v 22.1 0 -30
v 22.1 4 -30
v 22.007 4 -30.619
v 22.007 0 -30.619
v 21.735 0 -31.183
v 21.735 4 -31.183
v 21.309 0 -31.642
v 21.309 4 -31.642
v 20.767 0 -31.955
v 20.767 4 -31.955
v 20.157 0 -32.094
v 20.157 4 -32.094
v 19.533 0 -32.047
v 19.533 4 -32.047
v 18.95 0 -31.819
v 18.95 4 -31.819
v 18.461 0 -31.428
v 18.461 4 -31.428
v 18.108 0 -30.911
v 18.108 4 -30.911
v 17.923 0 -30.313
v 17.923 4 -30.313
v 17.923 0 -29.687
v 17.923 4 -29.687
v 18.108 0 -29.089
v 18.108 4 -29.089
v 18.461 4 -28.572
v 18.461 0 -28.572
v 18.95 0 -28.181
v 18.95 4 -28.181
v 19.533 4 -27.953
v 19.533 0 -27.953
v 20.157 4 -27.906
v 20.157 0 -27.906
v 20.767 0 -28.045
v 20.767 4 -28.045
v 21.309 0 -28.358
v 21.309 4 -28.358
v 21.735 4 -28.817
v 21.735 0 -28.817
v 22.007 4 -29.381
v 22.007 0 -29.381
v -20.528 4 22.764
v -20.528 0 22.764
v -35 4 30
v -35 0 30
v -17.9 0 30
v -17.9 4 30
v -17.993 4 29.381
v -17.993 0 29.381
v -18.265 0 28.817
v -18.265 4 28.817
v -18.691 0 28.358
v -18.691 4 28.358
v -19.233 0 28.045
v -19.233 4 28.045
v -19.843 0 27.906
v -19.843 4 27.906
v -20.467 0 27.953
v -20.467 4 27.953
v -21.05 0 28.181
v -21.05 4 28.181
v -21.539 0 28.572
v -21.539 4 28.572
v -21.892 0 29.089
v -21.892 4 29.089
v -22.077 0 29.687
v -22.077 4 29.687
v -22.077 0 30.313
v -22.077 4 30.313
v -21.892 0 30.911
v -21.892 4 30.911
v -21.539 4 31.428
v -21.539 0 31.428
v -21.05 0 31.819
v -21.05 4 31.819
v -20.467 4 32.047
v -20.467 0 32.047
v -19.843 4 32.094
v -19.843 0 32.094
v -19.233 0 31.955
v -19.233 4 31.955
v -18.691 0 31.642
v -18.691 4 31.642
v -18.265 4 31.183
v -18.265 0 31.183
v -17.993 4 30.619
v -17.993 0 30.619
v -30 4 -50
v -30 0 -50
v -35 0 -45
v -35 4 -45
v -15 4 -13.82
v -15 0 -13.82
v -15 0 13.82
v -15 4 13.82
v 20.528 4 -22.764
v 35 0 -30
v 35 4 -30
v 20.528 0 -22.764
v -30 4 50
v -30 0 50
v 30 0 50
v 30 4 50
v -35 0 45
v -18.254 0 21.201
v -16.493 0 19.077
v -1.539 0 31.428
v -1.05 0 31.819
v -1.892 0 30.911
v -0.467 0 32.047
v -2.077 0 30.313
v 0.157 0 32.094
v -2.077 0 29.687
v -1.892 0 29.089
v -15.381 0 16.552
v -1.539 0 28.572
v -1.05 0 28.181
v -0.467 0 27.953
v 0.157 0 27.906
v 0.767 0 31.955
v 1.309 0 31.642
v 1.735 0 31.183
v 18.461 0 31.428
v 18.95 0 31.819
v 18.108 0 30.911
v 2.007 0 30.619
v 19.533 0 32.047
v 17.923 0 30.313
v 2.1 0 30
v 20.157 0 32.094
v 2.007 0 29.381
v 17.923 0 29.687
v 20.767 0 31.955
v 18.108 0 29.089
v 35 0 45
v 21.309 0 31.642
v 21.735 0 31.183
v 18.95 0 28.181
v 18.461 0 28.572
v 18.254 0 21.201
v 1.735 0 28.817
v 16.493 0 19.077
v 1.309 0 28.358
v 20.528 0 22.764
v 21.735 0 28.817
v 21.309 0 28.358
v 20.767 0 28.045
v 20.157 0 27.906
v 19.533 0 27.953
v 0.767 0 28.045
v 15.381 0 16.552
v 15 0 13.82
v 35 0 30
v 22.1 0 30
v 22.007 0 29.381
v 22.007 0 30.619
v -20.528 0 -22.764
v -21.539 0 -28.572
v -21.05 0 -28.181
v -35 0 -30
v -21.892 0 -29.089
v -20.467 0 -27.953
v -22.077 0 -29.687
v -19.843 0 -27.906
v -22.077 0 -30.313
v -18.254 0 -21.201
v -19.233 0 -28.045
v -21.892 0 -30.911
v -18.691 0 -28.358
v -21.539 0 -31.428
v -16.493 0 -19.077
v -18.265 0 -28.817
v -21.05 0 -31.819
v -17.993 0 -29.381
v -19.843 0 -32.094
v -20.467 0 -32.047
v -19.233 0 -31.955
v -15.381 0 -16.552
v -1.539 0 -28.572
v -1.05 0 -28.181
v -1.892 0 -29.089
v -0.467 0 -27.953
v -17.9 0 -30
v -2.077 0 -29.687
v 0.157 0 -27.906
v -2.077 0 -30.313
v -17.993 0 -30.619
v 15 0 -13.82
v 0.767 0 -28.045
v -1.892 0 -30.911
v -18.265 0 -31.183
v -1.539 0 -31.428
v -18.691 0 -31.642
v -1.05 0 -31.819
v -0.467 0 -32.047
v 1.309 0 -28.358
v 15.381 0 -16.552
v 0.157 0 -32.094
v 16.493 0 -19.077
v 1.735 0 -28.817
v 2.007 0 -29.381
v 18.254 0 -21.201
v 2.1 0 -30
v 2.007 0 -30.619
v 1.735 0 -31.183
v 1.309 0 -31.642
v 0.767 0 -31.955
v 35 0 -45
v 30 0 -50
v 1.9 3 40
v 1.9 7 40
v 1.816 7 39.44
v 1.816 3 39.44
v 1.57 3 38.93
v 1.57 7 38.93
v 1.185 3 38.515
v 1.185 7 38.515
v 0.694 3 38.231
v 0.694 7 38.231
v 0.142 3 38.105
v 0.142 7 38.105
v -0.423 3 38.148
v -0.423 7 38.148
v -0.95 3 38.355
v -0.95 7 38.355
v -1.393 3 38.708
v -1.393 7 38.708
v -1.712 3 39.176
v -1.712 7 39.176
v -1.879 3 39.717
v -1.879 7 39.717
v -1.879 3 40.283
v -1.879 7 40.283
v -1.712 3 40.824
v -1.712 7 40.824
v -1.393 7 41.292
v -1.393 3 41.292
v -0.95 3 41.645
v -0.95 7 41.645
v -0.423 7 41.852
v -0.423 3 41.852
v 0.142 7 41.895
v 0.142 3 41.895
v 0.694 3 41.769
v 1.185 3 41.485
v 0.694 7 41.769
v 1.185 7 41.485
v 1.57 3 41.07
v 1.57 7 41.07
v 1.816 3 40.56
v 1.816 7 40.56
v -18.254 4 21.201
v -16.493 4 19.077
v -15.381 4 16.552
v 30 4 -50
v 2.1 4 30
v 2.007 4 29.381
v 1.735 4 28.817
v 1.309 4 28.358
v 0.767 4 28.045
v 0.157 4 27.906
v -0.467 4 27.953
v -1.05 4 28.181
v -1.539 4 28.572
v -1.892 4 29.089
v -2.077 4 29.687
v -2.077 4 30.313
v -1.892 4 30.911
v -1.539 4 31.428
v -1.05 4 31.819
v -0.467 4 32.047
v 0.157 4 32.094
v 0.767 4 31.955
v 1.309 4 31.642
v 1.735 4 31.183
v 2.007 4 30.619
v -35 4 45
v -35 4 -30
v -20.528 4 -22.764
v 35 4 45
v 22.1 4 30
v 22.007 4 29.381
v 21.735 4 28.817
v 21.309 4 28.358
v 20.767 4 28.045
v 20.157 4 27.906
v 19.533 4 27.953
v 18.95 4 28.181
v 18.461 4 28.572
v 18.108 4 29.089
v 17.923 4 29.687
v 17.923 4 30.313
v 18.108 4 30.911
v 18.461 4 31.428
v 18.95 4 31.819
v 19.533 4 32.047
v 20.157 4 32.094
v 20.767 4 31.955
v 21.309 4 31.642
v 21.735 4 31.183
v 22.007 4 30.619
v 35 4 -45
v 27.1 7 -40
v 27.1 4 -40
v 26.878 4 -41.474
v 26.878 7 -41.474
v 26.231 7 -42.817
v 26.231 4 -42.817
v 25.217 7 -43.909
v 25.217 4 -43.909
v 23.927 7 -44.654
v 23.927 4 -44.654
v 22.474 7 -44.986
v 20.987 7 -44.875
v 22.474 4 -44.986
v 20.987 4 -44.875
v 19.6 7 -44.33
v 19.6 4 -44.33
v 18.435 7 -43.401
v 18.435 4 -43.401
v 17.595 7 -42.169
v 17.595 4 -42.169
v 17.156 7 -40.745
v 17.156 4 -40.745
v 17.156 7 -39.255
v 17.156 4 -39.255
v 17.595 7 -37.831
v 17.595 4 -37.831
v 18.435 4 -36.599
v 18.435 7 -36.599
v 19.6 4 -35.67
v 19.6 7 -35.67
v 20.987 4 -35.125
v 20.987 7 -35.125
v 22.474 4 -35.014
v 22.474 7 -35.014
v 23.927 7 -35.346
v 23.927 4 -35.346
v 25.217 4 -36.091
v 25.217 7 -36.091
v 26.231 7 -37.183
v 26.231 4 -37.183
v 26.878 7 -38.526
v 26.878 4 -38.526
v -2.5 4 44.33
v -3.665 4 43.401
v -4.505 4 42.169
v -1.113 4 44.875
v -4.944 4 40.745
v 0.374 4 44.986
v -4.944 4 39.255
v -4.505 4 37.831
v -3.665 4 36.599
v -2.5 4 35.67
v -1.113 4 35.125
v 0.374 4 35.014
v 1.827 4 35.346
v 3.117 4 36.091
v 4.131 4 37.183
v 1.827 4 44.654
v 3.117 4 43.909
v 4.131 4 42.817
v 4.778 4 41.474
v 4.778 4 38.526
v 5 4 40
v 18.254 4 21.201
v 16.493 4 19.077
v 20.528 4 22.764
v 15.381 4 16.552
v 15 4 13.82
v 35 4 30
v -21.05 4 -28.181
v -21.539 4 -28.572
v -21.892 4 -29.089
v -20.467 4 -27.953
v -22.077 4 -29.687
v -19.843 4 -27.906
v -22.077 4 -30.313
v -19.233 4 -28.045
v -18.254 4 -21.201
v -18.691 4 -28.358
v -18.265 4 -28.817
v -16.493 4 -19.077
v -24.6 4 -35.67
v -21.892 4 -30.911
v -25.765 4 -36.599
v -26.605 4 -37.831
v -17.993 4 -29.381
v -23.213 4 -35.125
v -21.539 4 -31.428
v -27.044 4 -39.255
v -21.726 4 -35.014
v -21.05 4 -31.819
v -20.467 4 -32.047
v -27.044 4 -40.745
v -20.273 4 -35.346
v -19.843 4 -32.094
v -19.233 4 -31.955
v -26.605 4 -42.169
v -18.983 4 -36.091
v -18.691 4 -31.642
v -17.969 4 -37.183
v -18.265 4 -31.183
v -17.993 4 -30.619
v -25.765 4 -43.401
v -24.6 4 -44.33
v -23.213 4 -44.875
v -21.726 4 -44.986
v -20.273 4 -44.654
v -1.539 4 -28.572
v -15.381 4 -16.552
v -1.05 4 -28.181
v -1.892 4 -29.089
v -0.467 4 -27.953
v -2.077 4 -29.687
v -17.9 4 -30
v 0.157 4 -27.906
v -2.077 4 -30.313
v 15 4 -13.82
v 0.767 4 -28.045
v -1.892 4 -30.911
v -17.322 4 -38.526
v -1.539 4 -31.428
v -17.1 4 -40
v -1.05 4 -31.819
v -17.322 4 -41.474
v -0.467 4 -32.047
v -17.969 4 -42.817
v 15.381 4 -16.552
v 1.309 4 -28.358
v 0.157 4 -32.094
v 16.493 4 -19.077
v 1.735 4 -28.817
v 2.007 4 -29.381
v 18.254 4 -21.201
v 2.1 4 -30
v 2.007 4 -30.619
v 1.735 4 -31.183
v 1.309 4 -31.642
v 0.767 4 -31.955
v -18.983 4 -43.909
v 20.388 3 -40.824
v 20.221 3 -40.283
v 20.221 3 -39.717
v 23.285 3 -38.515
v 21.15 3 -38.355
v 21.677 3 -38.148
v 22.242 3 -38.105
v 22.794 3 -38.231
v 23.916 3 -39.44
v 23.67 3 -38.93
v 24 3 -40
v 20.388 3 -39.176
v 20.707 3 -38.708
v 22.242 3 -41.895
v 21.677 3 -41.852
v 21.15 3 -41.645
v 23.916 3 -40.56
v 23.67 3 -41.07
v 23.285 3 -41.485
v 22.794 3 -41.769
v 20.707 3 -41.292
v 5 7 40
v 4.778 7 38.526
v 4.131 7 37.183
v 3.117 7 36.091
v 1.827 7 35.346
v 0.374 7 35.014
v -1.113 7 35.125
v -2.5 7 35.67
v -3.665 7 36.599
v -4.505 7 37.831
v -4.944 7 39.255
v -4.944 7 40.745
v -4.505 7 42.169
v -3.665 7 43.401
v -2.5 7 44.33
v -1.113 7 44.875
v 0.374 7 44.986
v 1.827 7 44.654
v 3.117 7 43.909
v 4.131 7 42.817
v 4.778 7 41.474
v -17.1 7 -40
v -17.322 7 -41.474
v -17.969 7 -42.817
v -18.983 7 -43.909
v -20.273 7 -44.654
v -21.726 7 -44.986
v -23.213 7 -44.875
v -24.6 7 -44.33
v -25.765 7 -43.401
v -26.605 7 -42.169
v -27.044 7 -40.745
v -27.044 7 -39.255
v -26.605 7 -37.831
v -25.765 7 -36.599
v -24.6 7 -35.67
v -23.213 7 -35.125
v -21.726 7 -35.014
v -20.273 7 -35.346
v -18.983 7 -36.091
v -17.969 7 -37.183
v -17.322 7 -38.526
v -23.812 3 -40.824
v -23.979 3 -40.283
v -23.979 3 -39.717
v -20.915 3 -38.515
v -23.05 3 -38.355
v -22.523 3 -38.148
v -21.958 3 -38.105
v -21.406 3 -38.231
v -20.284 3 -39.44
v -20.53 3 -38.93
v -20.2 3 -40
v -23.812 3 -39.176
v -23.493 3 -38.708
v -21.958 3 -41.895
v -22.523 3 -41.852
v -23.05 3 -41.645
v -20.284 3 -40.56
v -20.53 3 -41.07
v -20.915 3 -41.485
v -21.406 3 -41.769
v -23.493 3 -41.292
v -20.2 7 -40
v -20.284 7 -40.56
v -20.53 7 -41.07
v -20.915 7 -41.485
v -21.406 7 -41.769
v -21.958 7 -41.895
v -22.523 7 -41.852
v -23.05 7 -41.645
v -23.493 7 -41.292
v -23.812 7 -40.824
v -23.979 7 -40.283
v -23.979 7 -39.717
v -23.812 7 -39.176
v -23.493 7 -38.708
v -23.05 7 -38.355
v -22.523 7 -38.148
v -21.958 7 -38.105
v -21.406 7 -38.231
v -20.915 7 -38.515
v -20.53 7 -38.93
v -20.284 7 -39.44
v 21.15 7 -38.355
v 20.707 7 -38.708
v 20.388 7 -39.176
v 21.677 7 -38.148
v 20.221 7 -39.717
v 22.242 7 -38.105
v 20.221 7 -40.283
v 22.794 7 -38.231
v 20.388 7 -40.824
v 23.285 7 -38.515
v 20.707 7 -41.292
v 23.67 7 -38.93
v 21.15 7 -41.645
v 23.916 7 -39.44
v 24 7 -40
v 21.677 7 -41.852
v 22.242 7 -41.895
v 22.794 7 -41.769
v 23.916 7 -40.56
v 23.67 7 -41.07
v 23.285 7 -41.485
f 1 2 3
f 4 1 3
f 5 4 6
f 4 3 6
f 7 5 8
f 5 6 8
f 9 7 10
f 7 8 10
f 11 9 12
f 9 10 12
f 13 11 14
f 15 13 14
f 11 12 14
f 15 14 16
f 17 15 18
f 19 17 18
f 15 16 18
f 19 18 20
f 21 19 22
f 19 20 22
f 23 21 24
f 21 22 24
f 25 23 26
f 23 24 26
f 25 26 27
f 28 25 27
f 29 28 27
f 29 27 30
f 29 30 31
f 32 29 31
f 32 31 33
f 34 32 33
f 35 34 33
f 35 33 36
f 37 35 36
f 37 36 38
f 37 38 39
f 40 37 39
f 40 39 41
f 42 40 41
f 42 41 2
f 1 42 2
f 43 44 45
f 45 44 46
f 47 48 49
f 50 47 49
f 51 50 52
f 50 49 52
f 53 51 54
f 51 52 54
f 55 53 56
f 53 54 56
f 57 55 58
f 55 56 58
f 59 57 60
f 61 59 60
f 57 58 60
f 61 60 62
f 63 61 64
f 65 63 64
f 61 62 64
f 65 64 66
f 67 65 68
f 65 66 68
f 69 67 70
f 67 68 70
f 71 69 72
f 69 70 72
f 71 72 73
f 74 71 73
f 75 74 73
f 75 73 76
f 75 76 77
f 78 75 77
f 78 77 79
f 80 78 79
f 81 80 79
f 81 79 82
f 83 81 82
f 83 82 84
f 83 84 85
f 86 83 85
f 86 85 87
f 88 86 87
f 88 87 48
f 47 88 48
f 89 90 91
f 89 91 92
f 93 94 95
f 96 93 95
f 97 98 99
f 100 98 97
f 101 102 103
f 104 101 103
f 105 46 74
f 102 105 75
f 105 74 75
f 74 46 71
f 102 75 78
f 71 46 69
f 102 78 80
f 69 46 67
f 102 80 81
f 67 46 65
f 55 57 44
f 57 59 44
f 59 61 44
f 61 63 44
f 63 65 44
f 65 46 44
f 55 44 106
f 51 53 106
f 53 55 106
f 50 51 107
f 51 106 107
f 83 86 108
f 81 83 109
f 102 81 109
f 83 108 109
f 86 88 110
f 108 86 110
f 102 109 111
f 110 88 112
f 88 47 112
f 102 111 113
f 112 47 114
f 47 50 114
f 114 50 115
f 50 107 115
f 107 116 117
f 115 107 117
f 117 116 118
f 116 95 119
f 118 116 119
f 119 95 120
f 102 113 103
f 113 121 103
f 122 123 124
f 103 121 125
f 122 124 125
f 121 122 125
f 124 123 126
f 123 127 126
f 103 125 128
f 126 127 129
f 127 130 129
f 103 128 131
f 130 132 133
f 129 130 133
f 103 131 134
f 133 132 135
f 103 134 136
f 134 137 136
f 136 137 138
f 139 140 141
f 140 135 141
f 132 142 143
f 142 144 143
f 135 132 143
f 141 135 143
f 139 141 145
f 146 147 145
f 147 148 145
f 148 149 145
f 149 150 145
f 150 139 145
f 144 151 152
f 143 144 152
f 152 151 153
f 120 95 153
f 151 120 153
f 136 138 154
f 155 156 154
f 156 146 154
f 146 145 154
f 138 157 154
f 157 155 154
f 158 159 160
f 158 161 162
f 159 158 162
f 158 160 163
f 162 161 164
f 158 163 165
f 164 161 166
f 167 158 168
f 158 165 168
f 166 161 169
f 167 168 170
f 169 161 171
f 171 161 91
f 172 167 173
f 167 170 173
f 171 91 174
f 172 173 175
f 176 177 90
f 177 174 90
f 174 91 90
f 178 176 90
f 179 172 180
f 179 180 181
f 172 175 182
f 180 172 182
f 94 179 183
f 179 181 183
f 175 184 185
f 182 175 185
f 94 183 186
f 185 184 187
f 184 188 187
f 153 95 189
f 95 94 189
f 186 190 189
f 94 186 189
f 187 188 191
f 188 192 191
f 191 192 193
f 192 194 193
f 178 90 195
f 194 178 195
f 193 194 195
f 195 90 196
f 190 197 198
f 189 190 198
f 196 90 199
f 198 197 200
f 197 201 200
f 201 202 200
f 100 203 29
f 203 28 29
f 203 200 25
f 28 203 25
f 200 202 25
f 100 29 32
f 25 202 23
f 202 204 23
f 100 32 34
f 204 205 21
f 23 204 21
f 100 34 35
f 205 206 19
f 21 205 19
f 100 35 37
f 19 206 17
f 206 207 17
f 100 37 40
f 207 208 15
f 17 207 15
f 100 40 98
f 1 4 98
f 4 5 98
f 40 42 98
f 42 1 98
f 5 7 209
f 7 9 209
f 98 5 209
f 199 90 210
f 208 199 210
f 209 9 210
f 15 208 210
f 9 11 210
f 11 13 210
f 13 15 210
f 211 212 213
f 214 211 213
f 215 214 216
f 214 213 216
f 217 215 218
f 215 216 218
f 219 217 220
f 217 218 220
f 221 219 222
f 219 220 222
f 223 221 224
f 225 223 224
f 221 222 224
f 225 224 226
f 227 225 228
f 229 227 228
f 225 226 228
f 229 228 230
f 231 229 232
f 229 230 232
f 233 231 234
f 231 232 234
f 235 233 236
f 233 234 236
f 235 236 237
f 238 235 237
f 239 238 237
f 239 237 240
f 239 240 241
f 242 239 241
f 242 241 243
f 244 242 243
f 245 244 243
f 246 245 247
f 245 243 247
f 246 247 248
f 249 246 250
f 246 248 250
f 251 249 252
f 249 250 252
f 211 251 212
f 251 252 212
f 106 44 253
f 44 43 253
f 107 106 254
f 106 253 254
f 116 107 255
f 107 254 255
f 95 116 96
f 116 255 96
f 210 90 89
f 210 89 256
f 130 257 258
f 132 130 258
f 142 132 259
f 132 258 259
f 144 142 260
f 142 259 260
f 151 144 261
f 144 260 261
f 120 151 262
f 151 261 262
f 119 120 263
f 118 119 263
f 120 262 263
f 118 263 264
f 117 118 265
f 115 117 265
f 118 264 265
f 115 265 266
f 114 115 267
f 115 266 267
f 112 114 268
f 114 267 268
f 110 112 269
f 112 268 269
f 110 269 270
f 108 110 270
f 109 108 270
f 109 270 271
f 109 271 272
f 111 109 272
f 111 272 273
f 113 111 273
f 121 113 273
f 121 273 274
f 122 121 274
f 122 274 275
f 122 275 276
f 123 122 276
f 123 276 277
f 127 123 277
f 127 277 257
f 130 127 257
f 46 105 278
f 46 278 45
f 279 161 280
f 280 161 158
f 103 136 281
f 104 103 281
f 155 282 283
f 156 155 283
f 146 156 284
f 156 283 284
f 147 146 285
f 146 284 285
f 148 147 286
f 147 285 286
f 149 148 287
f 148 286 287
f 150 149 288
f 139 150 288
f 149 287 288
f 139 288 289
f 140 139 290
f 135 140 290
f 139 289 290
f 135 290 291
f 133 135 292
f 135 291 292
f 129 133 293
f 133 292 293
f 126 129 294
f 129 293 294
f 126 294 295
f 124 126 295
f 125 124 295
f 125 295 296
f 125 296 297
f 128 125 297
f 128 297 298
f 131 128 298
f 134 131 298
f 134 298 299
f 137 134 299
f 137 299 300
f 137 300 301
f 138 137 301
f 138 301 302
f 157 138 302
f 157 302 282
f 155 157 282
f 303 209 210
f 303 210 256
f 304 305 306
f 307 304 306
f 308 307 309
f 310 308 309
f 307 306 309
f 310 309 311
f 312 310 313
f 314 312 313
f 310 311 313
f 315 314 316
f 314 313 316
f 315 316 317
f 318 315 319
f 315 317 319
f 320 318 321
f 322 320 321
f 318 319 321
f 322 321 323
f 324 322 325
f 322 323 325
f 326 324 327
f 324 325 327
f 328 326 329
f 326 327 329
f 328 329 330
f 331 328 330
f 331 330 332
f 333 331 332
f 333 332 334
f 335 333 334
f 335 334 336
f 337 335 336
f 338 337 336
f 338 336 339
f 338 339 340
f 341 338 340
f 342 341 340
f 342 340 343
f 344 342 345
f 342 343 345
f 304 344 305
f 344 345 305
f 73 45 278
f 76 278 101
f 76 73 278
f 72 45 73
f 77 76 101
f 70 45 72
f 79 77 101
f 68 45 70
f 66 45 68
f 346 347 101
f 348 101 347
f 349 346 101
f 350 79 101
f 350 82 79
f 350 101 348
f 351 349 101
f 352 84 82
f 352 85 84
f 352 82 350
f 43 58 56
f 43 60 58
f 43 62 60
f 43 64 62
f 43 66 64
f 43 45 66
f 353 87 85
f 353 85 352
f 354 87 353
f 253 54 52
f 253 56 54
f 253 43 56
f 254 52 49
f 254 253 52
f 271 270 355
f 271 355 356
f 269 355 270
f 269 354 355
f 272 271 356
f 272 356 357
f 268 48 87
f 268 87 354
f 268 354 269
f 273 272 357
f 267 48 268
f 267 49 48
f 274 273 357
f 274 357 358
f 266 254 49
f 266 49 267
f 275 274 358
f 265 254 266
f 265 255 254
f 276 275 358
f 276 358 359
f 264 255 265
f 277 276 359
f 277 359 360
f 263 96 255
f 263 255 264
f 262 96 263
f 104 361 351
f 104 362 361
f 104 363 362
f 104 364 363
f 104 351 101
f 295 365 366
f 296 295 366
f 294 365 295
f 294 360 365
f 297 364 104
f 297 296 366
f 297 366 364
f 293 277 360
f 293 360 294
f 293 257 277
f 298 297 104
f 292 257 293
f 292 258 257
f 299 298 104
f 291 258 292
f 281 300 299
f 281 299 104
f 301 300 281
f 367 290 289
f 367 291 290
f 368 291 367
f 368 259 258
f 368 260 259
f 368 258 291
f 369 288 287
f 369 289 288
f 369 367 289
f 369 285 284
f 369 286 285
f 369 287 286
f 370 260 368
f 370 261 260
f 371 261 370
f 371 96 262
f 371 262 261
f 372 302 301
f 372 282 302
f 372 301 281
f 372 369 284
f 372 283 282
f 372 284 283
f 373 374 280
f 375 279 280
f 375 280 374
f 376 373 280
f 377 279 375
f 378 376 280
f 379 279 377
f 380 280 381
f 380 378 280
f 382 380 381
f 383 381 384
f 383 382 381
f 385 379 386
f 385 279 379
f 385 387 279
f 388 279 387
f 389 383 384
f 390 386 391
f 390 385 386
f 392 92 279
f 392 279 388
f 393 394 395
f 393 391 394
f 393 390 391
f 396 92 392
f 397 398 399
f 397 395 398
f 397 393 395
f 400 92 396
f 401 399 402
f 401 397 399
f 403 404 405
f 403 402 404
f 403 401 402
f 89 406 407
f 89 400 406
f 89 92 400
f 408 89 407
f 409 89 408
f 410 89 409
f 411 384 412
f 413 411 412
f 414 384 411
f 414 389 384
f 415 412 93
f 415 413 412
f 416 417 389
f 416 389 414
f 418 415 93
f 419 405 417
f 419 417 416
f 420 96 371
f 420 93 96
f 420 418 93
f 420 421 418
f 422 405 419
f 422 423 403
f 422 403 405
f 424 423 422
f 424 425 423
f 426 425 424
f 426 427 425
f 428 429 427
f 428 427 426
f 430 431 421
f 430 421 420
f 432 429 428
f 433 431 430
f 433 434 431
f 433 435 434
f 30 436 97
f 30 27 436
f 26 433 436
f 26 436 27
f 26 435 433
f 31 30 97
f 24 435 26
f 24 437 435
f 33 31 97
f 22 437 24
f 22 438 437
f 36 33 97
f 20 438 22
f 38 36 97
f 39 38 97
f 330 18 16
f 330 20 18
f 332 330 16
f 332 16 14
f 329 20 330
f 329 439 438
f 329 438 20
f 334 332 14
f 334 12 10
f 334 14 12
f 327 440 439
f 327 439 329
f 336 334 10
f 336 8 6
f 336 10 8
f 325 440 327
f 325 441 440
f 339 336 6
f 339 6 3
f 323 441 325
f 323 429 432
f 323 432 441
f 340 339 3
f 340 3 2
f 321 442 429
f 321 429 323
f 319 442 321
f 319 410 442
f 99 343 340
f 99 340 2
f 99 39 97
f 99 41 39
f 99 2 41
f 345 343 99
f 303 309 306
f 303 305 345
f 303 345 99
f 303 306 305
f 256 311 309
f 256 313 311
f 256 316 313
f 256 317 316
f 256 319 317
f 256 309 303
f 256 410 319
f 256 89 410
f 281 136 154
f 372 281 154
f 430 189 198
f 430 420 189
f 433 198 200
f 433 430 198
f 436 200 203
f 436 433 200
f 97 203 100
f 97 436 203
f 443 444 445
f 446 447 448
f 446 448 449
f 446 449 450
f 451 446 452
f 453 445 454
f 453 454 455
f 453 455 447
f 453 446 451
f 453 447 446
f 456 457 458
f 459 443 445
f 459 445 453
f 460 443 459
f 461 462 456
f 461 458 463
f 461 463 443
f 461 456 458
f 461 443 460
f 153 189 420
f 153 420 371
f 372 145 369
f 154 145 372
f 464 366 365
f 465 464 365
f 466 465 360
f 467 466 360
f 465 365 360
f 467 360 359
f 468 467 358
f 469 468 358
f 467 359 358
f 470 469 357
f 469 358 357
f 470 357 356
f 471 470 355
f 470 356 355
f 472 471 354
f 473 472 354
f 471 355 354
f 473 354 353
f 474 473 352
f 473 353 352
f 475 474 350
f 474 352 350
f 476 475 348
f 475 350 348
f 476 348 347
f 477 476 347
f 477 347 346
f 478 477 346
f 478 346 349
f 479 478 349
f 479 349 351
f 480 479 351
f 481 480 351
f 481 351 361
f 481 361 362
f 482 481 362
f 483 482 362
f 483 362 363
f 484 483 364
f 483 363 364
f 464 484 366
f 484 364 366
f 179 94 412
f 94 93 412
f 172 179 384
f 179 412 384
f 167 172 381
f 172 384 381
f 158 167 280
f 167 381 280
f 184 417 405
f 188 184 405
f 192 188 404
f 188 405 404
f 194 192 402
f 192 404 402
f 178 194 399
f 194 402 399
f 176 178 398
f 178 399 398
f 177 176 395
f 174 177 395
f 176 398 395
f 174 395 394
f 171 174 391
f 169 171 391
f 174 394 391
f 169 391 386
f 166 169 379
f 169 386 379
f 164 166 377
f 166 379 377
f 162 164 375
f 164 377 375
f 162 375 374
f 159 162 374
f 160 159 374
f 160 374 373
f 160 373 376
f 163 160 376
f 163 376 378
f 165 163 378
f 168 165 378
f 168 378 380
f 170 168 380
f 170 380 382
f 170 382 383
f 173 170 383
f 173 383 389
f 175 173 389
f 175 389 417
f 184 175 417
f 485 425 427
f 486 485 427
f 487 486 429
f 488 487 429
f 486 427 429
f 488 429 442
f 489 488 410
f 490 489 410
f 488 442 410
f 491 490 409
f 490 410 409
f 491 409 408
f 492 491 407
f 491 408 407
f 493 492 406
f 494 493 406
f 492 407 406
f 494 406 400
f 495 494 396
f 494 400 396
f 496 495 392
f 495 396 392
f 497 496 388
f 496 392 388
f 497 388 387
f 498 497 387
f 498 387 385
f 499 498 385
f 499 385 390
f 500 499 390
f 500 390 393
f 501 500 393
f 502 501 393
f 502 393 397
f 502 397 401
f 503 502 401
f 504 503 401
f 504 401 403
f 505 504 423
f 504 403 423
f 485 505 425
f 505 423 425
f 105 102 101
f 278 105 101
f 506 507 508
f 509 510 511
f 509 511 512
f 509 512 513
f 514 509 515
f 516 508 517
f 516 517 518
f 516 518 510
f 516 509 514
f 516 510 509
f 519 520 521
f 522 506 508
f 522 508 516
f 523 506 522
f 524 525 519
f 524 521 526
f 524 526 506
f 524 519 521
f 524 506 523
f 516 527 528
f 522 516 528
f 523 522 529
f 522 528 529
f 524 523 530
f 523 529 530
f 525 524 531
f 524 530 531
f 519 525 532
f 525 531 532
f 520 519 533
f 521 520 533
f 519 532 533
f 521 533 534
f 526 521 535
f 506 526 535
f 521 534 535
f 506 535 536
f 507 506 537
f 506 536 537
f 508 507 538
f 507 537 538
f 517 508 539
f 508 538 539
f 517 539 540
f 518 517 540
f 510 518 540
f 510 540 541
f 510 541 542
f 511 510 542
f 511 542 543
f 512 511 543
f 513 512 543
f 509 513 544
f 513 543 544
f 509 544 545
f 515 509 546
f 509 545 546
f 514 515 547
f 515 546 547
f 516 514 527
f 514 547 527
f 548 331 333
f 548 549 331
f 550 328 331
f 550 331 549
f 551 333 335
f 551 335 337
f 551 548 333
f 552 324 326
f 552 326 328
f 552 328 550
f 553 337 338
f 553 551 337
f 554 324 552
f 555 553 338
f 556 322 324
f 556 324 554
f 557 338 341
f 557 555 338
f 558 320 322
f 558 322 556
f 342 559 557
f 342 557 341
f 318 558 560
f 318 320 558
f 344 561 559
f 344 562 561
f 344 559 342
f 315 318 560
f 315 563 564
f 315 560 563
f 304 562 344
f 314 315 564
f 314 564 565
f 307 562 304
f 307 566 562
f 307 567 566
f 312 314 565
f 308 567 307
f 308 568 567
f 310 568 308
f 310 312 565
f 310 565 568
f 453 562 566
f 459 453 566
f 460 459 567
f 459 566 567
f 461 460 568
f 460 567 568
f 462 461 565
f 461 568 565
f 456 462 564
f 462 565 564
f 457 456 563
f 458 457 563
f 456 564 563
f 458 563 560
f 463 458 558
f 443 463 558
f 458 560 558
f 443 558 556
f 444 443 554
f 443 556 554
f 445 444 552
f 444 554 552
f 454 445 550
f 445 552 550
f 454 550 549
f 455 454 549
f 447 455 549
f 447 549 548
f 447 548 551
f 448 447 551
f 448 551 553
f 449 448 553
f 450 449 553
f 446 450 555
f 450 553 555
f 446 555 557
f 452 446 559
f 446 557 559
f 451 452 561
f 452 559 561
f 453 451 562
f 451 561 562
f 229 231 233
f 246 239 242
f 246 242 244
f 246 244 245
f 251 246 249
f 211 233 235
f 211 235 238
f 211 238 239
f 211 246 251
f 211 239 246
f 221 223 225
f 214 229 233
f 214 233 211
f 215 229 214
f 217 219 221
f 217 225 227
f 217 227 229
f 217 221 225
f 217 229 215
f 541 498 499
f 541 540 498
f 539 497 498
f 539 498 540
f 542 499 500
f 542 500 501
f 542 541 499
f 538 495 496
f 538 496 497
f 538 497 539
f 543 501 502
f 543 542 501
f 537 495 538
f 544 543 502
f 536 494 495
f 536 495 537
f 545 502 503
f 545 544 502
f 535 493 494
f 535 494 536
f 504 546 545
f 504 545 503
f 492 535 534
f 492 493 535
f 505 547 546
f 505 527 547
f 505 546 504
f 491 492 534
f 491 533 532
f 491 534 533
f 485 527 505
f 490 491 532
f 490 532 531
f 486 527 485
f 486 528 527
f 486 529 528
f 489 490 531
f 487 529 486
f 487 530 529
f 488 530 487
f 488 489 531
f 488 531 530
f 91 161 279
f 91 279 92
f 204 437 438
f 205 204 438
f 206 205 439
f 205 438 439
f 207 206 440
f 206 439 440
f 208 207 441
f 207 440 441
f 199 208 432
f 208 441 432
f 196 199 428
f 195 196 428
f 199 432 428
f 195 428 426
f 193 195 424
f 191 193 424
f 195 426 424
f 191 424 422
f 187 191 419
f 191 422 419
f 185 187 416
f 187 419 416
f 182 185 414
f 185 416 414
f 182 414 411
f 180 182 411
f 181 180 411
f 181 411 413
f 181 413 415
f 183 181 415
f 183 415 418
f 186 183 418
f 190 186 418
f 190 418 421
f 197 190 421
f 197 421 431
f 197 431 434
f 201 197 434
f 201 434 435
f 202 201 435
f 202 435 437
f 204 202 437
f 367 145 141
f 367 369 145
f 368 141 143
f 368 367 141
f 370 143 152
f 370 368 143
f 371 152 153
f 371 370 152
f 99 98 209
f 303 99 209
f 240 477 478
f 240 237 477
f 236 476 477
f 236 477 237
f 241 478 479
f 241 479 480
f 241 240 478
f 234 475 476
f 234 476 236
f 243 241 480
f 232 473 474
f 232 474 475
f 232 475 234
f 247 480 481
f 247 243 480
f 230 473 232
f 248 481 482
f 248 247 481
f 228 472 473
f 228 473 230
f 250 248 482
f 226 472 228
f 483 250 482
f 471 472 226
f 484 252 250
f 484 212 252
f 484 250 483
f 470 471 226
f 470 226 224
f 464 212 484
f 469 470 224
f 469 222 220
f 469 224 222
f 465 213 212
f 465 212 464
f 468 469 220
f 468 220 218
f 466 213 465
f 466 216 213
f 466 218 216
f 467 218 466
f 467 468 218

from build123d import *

# Parameters (mm, degrees)
SKETCH_1_W                  = 70
SKETCH_1_H                  = 100
EXTRUDE_1_DEPTH             = 4
SKETCH_2_R                  = 5
EXTRUDE_2_DEPTH             = 3
SKETCH_3_R                  = 1.9
CUT_EXTRUDE_1_DEPTH         = 4
SKETCH_6_R                  = 2.1
CUT_EXTRUDE_4_DEPTH         = 5
PATTERN_LINEAR_1_COUNT      = 3
PATTERN_LINEAR_1_PITCH      = 20
PATTERN_LINEAR_1_COUNT_DIR2 = 4
PATTERN_LINEAR_1_PITCH_DIR2 = 20
CUT_EXTRUDE_START           = -5
CUT_EXTRUDE_5_DEPTH         = 9
CHAMFER_1_SIZE              = 5
FILLET_1_R                  = 10


with BuildPart() as part:
    # 草圖1 → 填料-伸長1 (new body)
    with BuildSketch(Plane(origin=(0, 0, 0), x_dir=(1, 0, 0), z_dir=(0, 1, 0))):
        Rectangle(SKETCH_1_W, SKETCH_1_H)
    extrude(amount=EXTRUDE_1_DEPTH)

    # 草圖2 → 填料-伸長2 (add)
    with BuildSketch(Plane(origin=(0, 4, 0), x_dir=(1, 0, 0), z_dir=(0, 1, 0))):
        with Locations((-22.1, 40)):
            Circle(SKETCH_2_R)
        with Locations((22.1, 40)):
            Circle(SKETCH_2_R)
        with Locations((0, -40)):
            Circle(SKETCH_2_R)
    extrude(amount=EXTRUDE_2_DEPTH)

    # 草圖3 → 除料-伸長1 (cut)
    with BuildSketch(Plane(origin=(0, 7, 0), x_dir=(1, 0, 0), z_dir=(0, 1, 0))):
        with Locations((-22.1, 40)):
            Circle(SKETCH_3_R)
        with Locations((22.1, 40)):
            Circle(SKETCH_3_R)
        with Locations((0, -40)):
            Circle(SKETCH_3_R)
    extrude(amount=-CUT_EXTRUDE_1_DEPTH, mode=Mode.SUBTRACT)

    # 草圖6 → 除料-伸長4 (cut, through all)
    with BuildSketch(Plane(origin=(0, 4, 0), x_dir=(1, 0, 0), z_dir=(0, 1, 0))):
        with Locations((-20, 30)):
            Circle(SKETCH_6_R)
    cut_extrude_4 = extrude(amount=-CUT_EXTRUDE_4_DEPTH, mode=Mode.SUBTRACT)

    # 直線複製排列1: Cut-Extrude 4 3 × 4, 6 skipped
    with Locations(*[(i * PATTERN_LINEAR_1_PITCH, 0, j * PATTERN_LINEAR_1_PITCH_DIR2) for i in range(PATTERN_LINEAR_1_COUNT) for j in range(PATTERN_LINEAR_1_COUNT_DIR2) if (i, j) not in ((0, 0), (0, 1), (0, 2), (1, 1), (1, 2), (2, 1), (2, 2))]):
        add(cut_extrude_4, mode=Mode.SUBTRACT)

    # 草圖7 → 除料-伸長5 (cut)
    with BuildSketch(Plane(origin=(0, 4, 0), x_dir=(1, 0, 0), z_dir=(0, 1, 0)).offset(CUT_EXTRUDE_START)):
        Polygon((-35, 30), (-15, 20), (-15, -20), (-35, -30), align=None)
    cut_extrude_5 = extrude(amount=CUT_EXTRUDE_5_DEPTH, mode=Mode.SUBTRACT)

    # 鏡射1: 除料-伸長5 across plane
    add(cut_extrude_5.mirror(Plane(origin=(0, 0, 0), x_dir=(0, 0, 1), z_dir=(1, 0, 0))), mode=Mode.SUBTRACT)

    # 導角1
    chamfer_1_edges = [part.edges().sort_by_distance(p)[0] for p in [
        (35, 2, 50),
        (-35, 2, 50),
        (-35, 2, -50),
        (35, 2, -50),
    ]]
    chamfer(chamfer_1_edges, length=CHAMFER_1_SIZE)

    # 圓角1
    fillet_1_edges = [part.edges().sort_by_distance(p)[0] for p in [
        (-15, 2, -20),
        (-15, 2, 20),
        (15, 2, 20),
        (15, 2, -20),
    ]]
    fillet(fillet_1_edges, radius=FILLET_1_R)


solid = part.part
